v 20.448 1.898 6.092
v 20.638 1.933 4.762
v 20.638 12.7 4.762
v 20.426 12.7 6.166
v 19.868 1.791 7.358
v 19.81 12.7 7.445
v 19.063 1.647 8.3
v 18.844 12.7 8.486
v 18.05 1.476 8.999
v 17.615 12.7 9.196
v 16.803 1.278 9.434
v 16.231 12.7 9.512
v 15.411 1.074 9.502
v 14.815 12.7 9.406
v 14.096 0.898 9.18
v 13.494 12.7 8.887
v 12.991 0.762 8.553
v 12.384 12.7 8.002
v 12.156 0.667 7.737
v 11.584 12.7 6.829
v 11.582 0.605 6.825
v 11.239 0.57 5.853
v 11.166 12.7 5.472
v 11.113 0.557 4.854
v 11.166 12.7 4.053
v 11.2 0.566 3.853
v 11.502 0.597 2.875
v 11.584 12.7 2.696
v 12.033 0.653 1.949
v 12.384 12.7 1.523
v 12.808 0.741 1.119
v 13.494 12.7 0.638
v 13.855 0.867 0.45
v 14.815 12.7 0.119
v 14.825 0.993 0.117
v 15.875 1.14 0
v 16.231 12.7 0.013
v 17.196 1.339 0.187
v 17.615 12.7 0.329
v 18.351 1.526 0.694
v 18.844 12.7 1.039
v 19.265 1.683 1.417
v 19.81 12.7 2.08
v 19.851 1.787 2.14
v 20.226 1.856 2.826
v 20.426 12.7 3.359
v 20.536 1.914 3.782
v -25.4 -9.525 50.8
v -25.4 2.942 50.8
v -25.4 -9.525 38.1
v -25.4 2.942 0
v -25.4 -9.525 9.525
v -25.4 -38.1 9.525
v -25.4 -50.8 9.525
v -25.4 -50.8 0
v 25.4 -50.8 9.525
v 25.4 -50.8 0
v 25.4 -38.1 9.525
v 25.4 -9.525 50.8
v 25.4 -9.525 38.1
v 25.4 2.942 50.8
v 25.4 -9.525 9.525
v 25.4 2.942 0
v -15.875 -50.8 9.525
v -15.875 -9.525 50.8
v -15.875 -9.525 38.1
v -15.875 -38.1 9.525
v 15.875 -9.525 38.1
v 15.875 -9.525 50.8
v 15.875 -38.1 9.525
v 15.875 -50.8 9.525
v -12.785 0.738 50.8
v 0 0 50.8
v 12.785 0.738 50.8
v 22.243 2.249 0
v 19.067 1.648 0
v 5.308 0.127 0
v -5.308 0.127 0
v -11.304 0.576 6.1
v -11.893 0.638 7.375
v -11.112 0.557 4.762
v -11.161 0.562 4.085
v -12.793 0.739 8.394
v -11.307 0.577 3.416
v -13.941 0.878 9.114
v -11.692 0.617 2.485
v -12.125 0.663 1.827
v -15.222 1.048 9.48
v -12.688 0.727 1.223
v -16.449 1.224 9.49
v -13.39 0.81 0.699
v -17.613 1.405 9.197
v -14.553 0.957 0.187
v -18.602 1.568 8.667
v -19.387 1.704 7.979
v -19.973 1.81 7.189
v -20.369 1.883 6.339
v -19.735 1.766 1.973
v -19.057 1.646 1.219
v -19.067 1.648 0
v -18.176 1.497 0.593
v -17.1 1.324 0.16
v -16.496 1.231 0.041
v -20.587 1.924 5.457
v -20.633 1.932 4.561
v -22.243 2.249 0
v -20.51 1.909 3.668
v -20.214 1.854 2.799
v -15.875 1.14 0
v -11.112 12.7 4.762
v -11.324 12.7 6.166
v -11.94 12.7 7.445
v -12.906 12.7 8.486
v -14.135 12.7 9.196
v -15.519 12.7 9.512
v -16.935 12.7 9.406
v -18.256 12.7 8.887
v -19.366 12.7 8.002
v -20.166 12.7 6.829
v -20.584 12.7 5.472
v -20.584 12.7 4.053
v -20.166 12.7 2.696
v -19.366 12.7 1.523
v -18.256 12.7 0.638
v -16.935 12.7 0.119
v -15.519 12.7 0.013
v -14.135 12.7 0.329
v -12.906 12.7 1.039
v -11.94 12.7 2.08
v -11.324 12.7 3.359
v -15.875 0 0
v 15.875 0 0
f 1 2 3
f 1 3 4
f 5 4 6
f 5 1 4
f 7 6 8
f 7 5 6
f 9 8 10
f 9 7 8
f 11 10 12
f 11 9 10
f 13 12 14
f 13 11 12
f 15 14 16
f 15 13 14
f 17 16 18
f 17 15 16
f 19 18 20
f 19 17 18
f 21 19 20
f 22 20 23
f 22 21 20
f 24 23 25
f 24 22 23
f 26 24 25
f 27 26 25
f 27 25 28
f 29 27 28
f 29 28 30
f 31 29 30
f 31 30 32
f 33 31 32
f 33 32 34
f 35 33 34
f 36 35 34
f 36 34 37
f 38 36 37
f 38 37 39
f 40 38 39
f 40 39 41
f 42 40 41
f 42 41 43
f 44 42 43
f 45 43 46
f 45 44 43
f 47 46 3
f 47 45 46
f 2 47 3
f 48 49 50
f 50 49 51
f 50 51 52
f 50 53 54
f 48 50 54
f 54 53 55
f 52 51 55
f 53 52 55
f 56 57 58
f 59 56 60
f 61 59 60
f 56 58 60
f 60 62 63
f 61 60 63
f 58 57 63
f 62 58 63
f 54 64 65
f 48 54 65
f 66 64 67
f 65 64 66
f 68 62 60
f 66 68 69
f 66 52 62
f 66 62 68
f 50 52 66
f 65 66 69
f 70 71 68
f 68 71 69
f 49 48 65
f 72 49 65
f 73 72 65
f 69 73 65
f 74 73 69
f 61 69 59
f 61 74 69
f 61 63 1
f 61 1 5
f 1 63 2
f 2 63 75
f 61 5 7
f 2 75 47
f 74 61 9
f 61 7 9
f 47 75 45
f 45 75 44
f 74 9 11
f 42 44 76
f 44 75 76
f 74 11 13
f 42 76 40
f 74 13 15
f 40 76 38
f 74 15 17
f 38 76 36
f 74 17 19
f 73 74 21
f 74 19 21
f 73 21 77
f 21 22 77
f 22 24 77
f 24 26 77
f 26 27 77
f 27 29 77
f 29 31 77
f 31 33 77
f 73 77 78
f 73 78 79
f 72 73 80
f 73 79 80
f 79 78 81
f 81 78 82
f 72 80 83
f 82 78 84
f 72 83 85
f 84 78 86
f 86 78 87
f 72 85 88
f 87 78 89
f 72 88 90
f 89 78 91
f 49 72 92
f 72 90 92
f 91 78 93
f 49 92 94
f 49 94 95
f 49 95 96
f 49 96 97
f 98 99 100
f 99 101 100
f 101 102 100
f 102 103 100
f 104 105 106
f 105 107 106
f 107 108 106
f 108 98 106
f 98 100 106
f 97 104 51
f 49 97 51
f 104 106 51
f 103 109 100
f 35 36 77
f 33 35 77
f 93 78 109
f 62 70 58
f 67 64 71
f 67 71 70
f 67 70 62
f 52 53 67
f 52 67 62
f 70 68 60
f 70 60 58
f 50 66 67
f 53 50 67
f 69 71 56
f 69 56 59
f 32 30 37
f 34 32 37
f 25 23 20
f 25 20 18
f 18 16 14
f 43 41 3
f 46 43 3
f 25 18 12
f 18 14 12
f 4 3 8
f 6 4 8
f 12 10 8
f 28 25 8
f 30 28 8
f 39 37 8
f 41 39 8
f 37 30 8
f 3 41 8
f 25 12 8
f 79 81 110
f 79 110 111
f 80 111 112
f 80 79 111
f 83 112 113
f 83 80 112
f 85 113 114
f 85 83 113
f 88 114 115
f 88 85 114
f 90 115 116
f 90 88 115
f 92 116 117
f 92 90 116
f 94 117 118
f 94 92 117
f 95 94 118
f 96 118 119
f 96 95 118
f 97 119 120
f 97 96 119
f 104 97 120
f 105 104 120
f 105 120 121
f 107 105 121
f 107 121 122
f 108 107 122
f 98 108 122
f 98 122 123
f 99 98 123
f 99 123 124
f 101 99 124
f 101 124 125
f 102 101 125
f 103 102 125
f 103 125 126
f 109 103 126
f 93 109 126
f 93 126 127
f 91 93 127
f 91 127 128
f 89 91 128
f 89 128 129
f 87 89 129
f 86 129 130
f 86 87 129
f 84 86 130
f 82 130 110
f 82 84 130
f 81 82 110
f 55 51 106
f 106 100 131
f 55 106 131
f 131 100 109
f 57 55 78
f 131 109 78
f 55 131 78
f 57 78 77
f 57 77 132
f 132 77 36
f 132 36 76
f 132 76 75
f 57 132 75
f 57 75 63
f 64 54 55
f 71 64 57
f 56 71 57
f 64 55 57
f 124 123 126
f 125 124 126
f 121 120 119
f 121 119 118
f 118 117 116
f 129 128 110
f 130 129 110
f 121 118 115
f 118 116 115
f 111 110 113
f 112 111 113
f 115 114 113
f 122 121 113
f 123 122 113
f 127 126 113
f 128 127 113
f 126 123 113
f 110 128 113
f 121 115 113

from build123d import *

# Parameters (mm, degrees)
F1_DEPTH      = 50.8
F3_DEPTH      = 15.875
F3_DEPTH_BACK = 15.875
F4_DEPTH      = 25.4
F4_DEPTH_BACK = 25.4
F5_R          = 4.7625
F6_DEPTH      = 12.7


with BuildPart() as f1:
    # F0 (on Top) → F1 (new body)
    with BuildSketch(Plane.XY):
        with BuildLine():
            Line((-25.4, -50.8), (25.4, -50.8))
            Line((25.4, -50.8), (25.4, 2.9417960125))
            ThreePointArc((25.4, 2.9417960125), (0, 0), (-25.4, 2.9417960125))
            Line((-25.4, 2.9417960125), (-25.4, -50.8))
        make_face()
    extrude(amount=F1_DEPTH)

    # F2 (on Right) → F3 (cut, two sides)
    with BuildSketch(Plane.YZ) as f3_sk:
        Polygon((-9.525, 50.8), (-50.8, 9.525), (-38.1, 9.525), (-9.525, 38.1), align=None)
        Polygon((-9.525, 38.1), (-38.1, 9.525), (-9.525, 9.525), align=None)
        Polygon((-50.8, 50.8), (-50.8, 9.525), (-9.525, 50.8), align=None)
    extrude(amount=F3_DEPTH, mode=Mode.SUBTRACT)
    extrude(f3_sk.sketch, amount=-F3_DEPTH_BACK, mode=Mode.SUBTRACT)

    # F2 (on Right) → F4 (cut, two sides)
    with BuildSketch(Plane.YZ) as f4_sk:
        Polygon((-9.525, 38.1), (-38.1, 9.525), (-9.525, 9.525), align=None)
        Polygon((-50.8, 50.8), (-50.8, 9.525), (-9.525, 50.8), align=None)
    extrude(amount=-F4_DEPTH, mode=Mode.SUBTRACT)
    extrude(f4_sk.sketch, amount=F4_DEPTH_BACK, mode=Mode.SUBTRACT)

    # F5 (on Front) → F6 (join)
    with BuildSketch(Plane.XZ):
        with Locations((-15.875, 4.7625)):
            Circle(F5_R)
        with Locations((15.875, 4.7625)):
            Circle(F5_R)
    extrude(amount=-F6_DEPTH)


solid = f1.part
